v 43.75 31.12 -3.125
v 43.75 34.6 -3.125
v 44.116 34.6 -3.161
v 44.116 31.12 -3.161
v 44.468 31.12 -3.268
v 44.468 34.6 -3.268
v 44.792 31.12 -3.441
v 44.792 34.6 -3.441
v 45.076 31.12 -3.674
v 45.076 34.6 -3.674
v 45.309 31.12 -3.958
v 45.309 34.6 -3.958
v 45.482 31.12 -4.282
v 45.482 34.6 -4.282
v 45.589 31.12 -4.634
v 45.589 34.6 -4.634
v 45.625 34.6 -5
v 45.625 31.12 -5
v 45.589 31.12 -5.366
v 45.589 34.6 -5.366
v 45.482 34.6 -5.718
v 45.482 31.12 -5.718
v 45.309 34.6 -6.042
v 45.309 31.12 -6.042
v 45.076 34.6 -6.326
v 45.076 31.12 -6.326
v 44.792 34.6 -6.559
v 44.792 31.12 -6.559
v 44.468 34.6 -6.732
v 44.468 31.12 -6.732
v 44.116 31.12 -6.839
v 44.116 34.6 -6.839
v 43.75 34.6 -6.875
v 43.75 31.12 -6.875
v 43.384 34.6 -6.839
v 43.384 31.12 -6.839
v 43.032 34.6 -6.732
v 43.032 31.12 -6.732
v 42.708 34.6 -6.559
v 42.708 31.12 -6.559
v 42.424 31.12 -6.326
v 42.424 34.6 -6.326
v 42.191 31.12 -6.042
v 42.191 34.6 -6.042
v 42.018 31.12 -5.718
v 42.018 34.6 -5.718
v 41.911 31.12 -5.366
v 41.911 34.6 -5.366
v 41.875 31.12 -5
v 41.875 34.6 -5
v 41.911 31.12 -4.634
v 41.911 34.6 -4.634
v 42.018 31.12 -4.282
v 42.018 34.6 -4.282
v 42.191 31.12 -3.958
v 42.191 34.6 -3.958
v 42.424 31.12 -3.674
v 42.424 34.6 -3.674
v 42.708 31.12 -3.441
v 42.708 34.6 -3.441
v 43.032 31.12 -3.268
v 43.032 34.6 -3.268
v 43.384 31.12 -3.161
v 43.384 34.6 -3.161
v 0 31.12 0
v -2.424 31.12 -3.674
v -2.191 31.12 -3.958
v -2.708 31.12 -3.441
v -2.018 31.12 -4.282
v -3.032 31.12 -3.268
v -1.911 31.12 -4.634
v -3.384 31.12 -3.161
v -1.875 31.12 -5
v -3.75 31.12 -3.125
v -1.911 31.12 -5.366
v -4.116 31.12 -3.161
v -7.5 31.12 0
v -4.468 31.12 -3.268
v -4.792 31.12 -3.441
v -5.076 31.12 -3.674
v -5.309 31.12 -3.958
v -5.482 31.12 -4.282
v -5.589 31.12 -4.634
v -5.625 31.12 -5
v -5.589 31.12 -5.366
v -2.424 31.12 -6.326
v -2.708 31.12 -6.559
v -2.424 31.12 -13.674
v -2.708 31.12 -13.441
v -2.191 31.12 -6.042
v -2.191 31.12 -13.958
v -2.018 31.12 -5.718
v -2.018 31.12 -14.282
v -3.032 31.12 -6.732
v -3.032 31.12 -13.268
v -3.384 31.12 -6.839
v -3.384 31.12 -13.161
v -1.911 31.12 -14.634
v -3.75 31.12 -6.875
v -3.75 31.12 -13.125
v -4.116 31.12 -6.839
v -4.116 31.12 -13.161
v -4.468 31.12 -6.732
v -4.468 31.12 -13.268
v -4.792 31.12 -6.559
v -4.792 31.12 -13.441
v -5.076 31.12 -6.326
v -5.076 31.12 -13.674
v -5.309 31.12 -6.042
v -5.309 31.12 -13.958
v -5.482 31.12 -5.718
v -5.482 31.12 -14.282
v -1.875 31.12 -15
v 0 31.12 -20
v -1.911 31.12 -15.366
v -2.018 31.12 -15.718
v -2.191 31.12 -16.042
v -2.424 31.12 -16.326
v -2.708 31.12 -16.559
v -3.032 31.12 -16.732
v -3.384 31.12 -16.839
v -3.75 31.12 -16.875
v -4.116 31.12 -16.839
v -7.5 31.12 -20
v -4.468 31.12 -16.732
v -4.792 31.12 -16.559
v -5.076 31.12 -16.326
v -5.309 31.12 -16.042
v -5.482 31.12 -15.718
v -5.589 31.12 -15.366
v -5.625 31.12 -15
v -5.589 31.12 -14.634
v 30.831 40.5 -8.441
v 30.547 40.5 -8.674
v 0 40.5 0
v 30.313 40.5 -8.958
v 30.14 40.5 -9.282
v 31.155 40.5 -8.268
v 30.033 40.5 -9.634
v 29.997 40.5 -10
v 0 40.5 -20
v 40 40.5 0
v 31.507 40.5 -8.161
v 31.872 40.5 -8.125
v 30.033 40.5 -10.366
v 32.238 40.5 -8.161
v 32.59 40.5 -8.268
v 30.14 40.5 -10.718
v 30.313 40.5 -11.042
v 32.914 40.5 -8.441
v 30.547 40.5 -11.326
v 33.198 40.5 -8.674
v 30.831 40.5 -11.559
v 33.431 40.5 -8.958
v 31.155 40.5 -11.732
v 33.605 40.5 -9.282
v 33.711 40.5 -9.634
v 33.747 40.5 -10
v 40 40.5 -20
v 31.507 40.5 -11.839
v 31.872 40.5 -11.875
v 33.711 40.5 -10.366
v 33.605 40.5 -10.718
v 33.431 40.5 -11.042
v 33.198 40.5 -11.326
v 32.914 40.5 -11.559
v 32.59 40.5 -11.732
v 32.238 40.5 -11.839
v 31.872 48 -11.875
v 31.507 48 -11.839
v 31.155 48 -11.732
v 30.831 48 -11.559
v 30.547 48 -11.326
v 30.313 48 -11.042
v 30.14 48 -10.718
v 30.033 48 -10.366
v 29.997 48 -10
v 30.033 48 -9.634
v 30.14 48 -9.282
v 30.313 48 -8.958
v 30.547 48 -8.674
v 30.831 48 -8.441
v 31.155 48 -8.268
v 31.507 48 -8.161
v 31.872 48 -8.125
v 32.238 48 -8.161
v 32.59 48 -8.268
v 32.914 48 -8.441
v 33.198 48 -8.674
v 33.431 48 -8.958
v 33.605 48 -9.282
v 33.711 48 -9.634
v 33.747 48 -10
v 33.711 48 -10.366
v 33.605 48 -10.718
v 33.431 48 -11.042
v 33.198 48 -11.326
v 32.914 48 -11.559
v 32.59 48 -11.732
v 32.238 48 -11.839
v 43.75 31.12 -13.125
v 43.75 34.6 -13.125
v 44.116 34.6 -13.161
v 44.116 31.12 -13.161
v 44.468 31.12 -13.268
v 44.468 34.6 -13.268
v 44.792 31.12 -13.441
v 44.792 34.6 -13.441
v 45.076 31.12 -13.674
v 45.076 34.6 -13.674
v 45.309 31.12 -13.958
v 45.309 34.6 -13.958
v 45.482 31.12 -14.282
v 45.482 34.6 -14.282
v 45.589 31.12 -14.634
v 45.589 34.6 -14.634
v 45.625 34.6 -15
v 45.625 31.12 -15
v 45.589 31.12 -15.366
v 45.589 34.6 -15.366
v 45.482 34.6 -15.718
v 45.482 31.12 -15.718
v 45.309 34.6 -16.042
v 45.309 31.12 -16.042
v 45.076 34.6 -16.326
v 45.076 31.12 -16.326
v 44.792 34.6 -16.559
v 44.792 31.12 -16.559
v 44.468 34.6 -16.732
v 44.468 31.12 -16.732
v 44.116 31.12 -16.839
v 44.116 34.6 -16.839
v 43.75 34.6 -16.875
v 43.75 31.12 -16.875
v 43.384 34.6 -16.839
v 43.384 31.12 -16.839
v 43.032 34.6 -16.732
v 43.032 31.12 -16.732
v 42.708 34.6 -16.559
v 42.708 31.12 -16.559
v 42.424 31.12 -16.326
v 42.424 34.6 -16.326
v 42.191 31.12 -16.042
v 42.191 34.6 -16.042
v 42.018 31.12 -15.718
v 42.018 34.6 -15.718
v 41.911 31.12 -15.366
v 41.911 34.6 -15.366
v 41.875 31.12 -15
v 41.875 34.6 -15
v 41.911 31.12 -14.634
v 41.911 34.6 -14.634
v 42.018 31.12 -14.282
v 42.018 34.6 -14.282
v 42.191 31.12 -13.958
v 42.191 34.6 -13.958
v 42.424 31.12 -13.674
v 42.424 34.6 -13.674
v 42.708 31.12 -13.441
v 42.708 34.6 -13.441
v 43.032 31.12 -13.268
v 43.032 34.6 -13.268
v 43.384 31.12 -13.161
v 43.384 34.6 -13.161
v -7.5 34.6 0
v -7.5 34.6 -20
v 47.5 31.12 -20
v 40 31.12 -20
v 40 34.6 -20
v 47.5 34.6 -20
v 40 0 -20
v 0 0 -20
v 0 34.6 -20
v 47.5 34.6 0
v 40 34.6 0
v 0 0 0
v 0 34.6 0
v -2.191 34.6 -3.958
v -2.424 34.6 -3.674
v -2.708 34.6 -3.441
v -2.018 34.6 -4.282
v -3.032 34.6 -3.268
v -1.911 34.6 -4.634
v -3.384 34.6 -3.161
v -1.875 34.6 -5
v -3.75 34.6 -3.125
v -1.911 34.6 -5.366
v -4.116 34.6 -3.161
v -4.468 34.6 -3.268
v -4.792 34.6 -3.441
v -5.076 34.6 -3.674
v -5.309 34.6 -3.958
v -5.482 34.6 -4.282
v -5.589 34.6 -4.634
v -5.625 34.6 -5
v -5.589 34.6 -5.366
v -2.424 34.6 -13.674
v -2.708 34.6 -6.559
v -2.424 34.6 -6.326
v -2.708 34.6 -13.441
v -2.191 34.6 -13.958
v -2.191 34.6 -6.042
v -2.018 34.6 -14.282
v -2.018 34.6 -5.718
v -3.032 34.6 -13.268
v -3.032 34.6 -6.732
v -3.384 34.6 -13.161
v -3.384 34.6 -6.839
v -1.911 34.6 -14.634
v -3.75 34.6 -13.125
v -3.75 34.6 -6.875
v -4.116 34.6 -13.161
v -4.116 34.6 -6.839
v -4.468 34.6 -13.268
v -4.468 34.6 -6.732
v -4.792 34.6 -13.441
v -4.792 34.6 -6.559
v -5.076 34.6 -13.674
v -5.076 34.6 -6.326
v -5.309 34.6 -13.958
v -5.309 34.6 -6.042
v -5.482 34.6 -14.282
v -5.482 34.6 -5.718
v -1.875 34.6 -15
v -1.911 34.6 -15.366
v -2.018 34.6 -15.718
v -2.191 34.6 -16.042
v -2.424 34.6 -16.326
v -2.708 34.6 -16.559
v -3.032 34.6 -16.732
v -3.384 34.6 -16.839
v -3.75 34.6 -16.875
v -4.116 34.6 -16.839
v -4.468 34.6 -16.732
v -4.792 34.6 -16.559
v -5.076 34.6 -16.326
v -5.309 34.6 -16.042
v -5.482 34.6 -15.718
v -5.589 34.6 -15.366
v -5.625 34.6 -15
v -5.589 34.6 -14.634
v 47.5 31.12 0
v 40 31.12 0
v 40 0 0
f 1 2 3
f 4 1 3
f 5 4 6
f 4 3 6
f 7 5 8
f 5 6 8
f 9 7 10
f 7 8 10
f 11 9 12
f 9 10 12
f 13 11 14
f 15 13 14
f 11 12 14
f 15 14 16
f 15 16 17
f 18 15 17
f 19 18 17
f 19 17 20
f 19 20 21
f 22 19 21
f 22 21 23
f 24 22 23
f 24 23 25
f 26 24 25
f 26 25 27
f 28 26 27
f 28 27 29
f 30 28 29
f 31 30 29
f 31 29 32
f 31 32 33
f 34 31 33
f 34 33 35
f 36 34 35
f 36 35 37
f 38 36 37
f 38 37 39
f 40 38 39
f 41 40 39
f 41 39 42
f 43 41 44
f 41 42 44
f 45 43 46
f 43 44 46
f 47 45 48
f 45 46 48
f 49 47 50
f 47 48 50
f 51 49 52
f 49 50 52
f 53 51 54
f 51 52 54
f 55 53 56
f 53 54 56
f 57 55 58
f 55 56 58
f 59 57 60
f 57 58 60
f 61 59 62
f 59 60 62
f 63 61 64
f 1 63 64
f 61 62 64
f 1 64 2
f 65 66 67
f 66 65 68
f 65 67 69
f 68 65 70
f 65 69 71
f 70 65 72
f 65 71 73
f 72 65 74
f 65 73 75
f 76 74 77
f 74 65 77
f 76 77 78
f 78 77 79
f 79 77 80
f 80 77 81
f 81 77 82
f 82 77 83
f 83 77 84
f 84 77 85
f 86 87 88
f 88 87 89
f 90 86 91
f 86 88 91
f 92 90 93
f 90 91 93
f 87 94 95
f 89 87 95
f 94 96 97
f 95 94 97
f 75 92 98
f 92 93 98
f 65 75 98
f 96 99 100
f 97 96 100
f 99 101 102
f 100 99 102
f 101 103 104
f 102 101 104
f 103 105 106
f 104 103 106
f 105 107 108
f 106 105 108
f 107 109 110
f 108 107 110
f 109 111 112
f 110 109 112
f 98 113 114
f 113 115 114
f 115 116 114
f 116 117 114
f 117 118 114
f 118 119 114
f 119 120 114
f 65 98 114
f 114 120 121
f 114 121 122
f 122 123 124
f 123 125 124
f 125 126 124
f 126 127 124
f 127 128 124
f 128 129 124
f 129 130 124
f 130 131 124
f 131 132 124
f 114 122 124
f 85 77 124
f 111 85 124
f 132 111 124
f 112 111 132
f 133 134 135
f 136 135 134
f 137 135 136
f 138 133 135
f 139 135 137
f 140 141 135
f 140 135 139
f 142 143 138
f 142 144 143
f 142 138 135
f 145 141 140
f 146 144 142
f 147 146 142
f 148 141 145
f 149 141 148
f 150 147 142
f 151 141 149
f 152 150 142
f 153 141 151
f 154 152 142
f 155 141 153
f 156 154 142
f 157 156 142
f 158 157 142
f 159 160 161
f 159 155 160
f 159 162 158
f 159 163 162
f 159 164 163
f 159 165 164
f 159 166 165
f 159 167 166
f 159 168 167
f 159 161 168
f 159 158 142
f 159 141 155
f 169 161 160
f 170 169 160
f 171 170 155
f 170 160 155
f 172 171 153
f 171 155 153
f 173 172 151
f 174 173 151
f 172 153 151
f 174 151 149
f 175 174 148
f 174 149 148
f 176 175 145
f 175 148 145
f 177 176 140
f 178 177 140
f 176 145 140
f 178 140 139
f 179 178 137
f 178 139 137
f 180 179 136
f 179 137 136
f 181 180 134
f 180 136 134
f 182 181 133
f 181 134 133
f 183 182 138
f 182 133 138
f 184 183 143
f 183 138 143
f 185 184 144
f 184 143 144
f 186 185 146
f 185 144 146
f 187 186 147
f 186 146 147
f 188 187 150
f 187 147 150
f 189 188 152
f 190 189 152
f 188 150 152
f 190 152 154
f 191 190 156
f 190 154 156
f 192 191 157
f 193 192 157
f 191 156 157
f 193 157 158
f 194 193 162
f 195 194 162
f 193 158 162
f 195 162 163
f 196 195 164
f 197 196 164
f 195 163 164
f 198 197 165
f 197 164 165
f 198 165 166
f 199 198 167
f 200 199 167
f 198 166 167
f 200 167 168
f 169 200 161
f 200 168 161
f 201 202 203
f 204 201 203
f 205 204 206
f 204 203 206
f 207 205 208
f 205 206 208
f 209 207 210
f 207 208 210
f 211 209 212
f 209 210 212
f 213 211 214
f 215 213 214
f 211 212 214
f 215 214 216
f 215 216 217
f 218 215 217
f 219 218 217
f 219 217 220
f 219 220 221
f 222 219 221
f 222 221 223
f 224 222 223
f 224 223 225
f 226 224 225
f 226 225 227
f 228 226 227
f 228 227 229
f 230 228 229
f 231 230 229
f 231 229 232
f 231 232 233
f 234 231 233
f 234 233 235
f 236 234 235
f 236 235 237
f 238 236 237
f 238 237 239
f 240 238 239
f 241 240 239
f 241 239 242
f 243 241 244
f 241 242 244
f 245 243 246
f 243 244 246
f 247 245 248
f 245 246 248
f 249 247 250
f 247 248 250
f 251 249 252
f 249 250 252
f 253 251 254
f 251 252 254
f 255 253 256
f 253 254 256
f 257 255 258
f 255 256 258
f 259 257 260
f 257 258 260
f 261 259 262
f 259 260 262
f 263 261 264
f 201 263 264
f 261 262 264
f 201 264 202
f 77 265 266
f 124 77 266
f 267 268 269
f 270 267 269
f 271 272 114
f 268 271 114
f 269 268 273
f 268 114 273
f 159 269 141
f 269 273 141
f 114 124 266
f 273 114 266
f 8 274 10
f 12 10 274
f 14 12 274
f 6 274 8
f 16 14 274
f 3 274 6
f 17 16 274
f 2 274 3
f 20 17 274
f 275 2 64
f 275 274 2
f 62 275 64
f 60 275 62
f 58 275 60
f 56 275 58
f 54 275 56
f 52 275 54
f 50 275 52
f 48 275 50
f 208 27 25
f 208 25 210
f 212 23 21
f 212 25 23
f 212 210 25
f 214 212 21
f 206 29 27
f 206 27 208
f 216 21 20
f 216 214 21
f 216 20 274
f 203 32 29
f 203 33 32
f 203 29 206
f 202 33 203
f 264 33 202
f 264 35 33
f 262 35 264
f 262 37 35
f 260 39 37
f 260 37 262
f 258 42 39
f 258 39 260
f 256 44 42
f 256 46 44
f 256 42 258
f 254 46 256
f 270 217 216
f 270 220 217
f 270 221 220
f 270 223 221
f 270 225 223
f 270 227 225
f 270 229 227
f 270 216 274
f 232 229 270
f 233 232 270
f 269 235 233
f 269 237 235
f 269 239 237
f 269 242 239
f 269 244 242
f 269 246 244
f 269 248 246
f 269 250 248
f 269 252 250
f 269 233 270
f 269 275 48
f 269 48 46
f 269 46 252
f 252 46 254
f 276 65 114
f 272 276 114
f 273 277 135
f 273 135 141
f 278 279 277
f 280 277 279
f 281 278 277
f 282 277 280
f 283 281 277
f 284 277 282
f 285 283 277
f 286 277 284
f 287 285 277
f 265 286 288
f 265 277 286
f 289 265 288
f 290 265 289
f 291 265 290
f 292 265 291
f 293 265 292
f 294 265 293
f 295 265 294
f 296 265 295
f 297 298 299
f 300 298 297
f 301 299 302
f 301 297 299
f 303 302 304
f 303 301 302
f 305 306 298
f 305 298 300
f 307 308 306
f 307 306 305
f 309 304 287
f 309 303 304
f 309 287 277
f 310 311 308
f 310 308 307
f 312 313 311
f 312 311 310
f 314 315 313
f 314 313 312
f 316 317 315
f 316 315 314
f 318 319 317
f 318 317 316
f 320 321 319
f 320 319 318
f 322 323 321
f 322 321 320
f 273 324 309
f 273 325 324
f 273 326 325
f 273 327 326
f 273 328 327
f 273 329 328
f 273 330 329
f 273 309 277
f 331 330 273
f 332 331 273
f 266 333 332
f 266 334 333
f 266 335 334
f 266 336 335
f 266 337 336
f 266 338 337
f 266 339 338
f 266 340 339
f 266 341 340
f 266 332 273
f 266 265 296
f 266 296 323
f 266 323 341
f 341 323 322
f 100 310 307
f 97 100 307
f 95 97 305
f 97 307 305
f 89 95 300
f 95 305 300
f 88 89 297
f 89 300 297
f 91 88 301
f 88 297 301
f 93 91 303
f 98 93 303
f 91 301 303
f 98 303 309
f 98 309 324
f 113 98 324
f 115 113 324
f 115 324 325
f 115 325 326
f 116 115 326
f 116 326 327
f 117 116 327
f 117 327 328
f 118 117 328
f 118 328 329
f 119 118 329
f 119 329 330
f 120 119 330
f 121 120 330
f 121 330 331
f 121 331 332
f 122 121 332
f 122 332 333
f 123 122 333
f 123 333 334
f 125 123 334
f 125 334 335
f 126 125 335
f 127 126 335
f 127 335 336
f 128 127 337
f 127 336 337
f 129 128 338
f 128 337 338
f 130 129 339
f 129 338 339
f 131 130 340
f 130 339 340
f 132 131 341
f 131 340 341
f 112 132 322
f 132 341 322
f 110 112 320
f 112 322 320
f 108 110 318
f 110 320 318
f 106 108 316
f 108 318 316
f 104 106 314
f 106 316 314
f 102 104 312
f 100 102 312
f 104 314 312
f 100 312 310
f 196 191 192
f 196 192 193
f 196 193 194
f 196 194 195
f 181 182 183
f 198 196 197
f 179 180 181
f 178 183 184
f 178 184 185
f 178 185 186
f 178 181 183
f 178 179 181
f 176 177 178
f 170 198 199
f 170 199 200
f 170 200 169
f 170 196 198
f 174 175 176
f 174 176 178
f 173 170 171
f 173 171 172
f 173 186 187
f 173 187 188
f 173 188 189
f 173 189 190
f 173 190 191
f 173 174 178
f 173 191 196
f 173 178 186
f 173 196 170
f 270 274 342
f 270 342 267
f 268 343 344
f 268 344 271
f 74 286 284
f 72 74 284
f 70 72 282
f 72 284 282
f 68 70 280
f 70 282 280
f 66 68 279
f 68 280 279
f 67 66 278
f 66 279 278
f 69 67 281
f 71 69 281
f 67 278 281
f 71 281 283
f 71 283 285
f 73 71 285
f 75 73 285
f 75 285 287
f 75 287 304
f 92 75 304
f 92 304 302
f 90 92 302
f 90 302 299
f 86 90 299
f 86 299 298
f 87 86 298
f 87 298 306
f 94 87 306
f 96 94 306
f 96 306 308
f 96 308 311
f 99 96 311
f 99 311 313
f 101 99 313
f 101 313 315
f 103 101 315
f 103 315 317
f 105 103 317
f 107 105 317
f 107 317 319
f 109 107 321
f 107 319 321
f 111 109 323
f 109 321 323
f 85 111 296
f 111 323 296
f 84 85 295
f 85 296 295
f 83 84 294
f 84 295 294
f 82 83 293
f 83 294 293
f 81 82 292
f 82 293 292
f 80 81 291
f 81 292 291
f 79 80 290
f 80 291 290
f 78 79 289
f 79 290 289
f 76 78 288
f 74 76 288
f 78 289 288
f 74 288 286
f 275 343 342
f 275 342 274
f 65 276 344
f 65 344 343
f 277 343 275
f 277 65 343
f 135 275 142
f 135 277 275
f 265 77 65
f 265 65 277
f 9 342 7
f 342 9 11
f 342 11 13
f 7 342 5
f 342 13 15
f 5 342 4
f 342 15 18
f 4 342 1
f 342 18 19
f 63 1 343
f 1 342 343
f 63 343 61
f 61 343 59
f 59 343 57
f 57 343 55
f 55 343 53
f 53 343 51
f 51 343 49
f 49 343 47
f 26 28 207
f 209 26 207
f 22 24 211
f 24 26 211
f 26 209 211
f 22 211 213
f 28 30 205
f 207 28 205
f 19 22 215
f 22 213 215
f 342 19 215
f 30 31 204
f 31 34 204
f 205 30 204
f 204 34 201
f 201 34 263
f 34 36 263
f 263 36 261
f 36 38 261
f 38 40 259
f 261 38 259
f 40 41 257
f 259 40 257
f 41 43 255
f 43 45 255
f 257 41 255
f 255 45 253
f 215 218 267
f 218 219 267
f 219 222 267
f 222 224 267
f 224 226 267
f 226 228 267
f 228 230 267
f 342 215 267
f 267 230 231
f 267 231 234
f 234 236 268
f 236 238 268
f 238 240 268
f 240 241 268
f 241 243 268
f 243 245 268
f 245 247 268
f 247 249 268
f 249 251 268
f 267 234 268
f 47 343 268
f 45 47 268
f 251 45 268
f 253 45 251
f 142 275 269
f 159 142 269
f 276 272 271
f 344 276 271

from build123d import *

# Parameters (mm, degrees)
SKETCH1_W                = 40
SKETCH1_H                = 20
BOSS_EXTRUDE1_DEPTH      = 40.5
BOSS_EXTRUDE2_DEPTH      = 7.5
BOSS_EXTRUDE2_DEPTH_BACK = 47.5
SKETCH2_W                = 20
SKETCH2_H                = 3.48
SKETCH3_R                = 1.875
CUT_EXTRUDE1_DEPTH       = 63.075840711
SKETCH4_R                = 1.875
BOSS_EXTRUDE3_DEPTH      = 7.5


with BuildPart() as part:
    # Sketch1 → Boss-Extrude1 (new body)
    with BuildSketch(Plane(origin=(0, 0, 0), x_dir=(1, 0, 0), z_dir=(0, 1, 0))):
        with Locations((20, 10)):
            Rectangle(SKETCH1_W, SKETCH1_H)
    extrude(amount=BOSS_EXTRUDE1_DEPTH)

    # Sketch2 → Boss-Extrude2 (add, two sides: drawn at the far end of the back side and taken through both)
    with BuildSketch(Plane(origin=(40, 0, 0), x_dir=(0, 0, -1), z_dir=(1, 0, 0)).offset(-BOSS_EXTRUDE2_DEPTH_BACK)):
        with Locations((10, 32.86)):
            Rectangle(SKETCH2_W, SKETCH2_H)
    extrude(amount=BOSS_EXTRUDE2_DEPTH + BOSS_EXTRUDE2_DEPTH_BACK)

    # Sketch3 → Cut-Extrude1 (cut, through all)
    with BuildSketch(Plane(origin=(0, 34.6, 0), x_dir=(1, 0, 0), z_dir=(0, 1, 0))):
        with Locations(Location((43.75, 15, 0), (0, 0, 270))):
            Circle(SKETCH3_R)
        with Locations(Location((43.75, 5, 0), (0, 0, 270))):
            Circle(SKETCH3_R)
        with Locations(Location((-3.75, 15, 0), (0, 0, 270))):
            Circle(SKETCH3_R)
        with Locations(Location((-3.75, 5, 0), (0, 0, 270))):
            Circle(SKETCH3_R)
    extrude(amount=-CUT_EXTRUDE1_DEPTH, mode=Mode.SUBTRACT)

    # Sketch4 → Boss-Extrude3 (add)
    with BuildSketch(Plane(origin=(0, 40.5, 0), x_dir=(1, 0, 0), z_dir=(0, 1, 0))):
        with Locations(Location((31.8724, 10, 0), (0, 0, 90))):
            Circle(SKETCH4_R)
    extrude(amount=BOSS_EXTRUDE3_DEPTH)


solid = part.part
